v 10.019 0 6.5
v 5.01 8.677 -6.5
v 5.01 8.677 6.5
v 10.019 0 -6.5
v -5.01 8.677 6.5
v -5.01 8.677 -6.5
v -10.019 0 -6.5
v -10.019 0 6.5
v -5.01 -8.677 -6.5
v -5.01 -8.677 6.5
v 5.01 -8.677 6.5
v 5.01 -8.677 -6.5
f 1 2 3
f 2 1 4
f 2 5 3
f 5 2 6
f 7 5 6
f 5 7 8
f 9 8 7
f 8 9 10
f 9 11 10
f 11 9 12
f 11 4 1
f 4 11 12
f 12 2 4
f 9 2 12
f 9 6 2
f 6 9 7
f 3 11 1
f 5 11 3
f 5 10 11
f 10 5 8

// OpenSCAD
spindleD = 23.3;
spindleH = 6.5;
bladeLength = 11;

module fanNut() {
    cylinder(d=spindleD, h= spindleH, $fn=6, center=true);
}

module fanNutHole() {
    cylinder(d=spindleD*0.86, h= spindleH*2, $fn=6, center=true);
}

module fanBlade() {
linear_extrude(height = bladeLength, center = true, convexity = 10, twist = 70) square([2.5, spindleH*.9], center=true);
}

module fanBlades() {
union() {
//fanNut();
translate([bladeLength*1.25,0,0])rotate(a=[0,90,180]) fanBlade();
translate([-bladeLength*1.25,0,0])rotate(a=[0,90,0]) fanBlade();
translate([0,bladeLength*1.25,0])rotate(a=[90,90,0]) fanBlade();
translate([0,-bladeLength*1.25,0])rotate(a=[90,90,180]) fanBlade();
    
// middle blades

translate([bladeLength*0.85,bladeLength*1,0])rotate(a=[-50,90,180]) fanBlade();
translate([-bladeLength*0.85,bladeLength*1,0])rotate(a=[55,90,0]) fanBlade();
translate([bladeLength*0.85,-bladeLength*1,0])rotate(a=[60,90,180]) fanBlade();
translate([-bladeLength*0.85,-bladeLength*1,0])rotate(a=[-60,90,0]) fanBlade();
    }
}

module fanblades() {
 function g(x) = [ 5 * x + 20, f(x) * f(x) - 50, 0 ];

color("green")
    for (a = [ -200 : 10 : 200 ])
        translate(g(a / 8)) sphere(1);
   
}

module fan() {
difference() {
    //fanBlades();
    fanNutHole();
    }
}

fan();
    
